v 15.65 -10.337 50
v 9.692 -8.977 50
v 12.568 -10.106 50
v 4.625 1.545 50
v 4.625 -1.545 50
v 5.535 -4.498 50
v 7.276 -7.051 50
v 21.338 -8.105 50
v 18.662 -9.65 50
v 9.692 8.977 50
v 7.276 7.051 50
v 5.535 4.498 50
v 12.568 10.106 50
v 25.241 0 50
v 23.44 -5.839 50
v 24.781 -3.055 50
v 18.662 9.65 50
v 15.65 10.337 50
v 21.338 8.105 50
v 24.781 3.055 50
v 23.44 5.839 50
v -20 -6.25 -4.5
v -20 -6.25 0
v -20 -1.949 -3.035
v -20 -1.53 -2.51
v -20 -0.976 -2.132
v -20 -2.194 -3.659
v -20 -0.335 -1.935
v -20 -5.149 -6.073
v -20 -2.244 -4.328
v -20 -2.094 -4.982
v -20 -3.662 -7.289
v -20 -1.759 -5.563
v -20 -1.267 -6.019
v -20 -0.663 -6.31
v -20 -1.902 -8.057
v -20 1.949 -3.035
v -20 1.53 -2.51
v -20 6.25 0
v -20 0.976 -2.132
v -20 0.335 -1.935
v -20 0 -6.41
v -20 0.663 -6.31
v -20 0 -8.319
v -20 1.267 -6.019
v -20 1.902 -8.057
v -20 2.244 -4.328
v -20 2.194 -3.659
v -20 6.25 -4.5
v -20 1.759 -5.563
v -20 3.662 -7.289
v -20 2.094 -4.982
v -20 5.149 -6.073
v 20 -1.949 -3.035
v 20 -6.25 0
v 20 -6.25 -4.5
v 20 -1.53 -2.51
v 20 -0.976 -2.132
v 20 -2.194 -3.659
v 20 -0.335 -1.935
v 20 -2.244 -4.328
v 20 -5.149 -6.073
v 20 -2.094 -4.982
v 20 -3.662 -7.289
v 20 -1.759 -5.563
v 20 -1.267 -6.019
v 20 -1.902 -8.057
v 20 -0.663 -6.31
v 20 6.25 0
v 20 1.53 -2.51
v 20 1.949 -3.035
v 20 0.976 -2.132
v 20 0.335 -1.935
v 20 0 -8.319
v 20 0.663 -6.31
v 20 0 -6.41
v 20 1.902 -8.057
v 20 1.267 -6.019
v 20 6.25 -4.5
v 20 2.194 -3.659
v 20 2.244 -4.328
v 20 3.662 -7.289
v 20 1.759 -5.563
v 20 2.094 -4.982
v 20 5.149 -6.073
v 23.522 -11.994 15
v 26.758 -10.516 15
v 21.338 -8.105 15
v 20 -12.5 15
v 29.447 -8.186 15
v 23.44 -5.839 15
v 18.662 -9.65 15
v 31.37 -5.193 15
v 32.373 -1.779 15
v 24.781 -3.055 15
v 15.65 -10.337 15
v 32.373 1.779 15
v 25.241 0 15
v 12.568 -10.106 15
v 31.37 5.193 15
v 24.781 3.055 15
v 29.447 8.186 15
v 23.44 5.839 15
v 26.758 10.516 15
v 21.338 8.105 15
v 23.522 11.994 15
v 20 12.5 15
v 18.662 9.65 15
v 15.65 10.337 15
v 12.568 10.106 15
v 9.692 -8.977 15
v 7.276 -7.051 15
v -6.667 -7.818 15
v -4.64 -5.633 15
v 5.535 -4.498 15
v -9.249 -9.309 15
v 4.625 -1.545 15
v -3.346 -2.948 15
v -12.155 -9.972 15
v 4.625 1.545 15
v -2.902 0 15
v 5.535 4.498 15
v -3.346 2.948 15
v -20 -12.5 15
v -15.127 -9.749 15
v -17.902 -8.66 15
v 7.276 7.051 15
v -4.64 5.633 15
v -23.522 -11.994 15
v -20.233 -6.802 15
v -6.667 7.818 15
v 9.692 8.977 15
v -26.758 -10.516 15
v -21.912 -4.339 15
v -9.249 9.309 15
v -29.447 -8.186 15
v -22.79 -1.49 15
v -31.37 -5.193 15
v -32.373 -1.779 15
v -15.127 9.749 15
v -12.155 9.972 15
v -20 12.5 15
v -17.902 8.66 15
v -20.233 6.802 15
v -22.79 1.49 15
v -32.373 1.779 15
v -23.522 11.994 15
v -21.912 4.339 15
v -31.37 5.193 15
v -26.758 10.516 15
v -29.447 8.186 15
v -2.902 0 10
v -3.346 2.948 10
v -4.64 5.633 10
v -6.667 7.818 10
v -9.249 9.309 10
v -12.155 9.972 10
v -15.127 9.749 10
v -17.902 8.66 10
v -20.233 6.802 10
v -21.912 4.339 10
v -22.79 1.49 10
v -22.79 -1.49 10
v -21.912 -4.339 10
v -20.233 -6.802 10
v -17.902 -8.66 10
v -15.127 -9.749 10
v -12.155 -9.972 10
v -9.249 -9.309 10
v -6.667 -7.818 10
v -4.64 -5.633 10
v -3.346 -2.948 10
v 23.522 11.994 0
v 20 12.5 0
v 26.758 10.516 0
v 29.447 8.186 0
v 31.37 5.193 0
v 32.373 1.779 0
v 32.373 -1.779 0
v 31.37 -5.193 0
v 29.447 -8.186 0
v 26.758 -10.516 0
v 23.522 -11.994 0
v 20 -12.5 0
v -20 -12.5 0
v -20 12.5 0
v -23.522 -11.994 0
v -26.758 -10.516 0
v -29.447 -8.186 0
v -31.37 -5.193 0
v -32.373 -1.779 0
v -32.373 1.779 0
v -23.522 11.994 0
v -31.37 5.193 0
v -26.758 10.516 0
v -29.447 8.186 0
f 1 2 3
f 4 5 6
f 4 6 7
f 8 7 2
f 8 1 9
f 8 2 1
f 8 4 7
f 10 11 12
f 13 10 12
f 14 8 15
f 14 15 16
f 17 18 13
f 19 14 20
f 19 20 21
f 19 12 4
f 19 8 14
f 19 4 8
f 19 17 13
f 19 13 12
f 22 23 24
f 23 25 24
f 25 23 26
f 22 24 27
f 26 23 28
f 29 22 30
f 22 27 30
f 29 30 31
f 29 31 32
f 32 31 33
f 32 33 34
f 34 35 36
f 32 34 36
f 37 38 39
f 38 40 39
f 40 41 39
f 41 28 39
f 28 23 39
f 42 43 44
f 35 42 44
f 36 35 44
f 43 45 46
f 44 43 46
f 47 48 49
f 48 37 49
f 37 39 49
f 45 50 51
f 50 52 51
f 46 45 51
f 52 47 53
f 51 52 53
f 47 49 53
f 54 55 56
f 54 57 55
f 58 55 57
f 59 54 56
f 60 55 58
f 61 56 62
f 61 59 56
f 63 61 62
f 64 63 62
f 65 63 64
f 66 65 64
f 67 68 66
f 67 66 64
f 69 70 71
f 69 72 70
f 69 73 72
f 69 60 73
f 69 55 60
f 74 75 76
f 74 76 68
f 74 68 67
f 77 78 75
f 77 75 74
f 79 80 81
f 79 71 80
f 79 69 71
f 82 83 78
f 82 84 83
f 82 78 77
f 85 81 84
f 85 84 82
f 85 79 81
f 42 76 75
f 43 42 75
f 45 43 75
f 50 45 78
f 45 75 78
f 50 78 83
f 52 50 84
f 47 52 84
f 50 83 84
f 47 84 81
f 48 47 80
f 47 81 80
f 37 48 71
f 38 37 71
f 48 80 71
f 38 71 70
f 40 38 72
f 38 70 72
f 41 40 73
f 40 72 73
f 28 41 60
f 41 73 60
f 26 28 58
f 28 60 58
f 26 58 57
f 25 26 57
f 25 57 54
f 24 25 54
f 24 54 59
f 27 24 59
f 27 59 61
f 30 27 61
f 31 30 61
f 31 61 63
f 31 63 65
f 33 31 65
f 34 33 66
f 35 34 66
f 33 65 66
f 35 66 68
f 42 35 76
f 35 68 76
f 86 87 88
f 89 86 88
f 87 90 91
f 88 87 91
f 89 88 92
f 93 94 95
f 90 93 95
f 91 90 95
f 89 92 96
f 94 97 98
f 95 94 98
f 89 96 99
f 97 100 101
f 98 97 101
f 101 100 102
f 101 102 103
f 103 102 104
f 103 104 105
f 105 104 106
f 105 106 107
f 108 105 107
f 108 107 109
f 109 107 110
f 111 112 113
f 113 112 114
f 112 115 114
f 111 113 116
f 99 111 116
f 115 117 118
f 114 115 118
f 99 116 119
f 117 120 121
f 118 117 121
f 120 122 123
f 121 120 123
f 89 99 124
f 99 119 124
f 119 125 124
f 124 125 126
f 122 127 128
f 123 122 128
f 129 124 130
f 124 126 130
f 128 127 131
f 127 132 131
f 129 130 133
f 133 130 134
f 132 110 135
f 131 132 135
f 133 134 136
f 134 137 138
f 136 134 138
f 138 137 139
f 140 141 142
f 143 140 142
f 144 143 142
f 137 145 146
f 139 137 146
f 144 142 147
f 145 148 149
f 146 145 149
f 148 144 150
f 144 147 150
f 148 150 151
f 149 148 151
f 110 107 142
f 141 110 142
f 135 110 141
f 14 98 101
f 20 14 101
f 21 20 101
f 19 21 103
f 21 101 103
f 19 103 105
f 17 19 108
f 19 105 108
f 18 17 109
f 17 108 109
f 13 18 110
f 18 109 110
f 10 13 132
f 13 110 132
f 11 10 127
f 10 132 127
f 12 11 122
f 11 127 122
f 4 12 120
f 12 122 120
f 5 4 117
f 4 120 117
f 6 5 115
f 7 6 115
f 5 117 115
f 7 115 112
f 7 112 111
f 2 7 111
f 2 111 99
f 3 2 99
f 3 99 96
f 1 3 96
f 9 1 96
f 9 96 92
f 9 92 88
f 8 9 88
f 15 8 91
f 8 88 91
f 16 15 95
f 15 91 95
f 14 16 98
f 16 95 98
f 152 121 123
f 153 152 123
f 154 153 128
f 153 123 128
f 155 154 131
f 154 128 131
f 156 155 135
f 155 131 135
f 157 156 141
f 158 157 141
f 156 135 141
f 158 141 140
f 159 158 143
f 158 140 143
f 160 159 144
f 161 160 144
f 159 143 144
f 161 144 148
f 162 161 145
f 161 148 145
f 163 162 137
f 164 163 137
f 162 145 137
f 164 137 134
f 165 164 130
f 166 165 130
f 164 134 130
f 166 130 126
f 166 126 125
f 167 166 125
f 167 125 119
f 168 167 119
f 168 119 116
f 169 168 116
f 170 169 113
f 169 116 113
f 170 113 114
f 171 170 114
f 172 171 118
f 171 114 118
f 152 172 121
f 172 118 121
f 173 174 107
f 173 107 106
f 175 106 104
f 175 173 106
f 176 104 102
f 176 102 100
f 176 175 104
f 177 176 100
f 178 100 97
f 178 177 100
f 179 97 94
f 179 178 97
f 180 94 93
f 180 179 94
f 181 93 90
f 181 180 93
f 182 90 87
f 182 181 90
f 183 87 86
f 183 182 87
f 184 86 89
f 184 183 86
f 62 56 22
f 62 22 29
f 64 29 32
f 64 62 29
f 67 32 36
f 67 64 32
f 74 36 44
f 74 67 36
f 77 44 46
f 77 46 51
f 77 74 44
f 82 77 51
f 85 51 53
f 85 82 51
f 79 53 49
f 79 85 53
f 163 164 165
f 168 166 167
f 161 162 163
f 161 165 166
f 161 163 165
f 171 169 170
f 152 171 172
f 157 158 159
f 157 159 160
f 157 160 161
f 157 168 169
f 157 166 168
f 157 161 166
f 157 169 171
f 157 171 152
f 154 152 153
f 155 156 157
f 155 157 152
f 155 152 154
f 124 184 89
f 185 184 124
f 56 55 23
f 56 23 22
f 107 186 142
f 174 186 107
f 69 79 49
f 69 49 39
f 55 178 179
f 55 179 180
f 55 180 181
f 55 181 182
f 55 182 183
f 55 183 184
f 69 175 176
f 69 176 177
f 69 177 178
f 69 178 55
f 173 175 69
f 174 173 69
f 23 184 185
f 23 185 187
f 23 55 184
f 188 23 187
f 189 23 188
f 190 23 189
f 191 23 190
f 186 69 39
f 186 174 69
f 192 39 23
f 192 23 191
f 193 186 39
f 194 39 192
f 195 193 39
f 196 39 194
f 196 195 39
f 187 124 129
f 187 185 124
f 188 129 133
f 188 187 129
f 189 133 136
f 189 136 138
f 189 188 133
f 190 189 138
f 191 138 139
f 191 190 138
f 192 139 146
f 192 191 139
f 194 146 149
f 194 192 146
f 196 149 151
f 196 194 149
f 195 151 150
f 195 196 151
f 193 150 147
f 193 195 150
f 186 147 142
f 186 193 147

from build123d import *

# Parameters (mm, degrees)
BOSS_EXTRUDE1_DEPTH = 5
BOSS_EXTRUDE2_DEPTH = 5
BOSS_EXTRUDE3_DEPTH = 5
SKETCH5_R           = 10
SKETCH5_R_2         = 7.5
CUT_EXTRUDE1_DEPTH  = 5
SKETCH6_R           = 10.366071997
BOSS_EXTRUDE4_DEPTH = 35
SKETCH7_R           = 7.5
CUT_EXTRUDE2_DEPTH  = 5
BOSS_EXTRUDE5_DEPTH = 40
SKETCH10_R          = 2.25
CUT_EXTRUDE3_DEPTH  = 40


with BuildPart() as part:
    # Sketch1 → Boss-Extrude1 (new body)
    with BuildSketch(Plane.XY):
        with BuildLine():
            Line((-20, 12.5), (20, 12.5))
            ThreePointArc((20, 12.5), (32.5, 0), (20, -12.5))
            Line((20, -12.5), (-20, -12.5))
            ThreePointArc((-20, -12.5), (-32.5, 0), (-20, 12.5))
        make_face()
    extrude(amount=BOSS_EXTRUDE1_DEPTH)

    # Sketch2 → Boss-Extrude2 (add)
    with BuildSketch(Plane.XY.offset(5)):
        with BuildLine():
            Line((-20, 12.5), (20, 12.5))
            ThreePointArc((20, 12.5), (32.5, 0), (20, -12.5))
            Line((20, -12.5), (-20, -12.5))
            ThreePointArc((-20, -12.5), (-32.5, 0), (-20, 12.5))
        make_face()
    extrude(amount=BOSS_EXTRUDE2_DEPTH)

    # Sketch4 → Boss-Extrude3 (add)
    with BuildSketch(Plane.XY.offset(10)):
        with BuildLine():
            Line((-20, 12.5), (20, 12.5))
            ThreePointArc((20, 12.5), (32.5, 0), (20, -12.5))
            Line((20, -12.5), (-20, -12.5))
            ThreePointArc((-20, -12.5), (-32.5, 0), (-20, 12.5))
        make_face()
    extrude(amount=BOSS_EXTRUDE3_DEPTH)

    # Sketch5 → Cut-Extrude1 (cut)
    with BuildSketch(Plane.XY.offset(15)):
        with Locations((-12.902032685, 0)):
            Circle(SKETCH5_R)
        with Locations((-12.902032685, 0)):
            Circle(SKETCH5_R_2, mode=Mode.SUBTRACT)
    extrude(amount=-CUT_EXTRUDE1_DEPTH, mode=Mode.SUBTRACT)

    # Sketch6 → Boss-Extrude4 (add)
    with BuildSketch(Plane.XY.offset(15)):
        with Locations((14.874986592, 0)):
            Circle(SKETCH6_R)
    extrude(amount=BOSS_EXTRUDE4_DEPTH)

    # Sketch7 → Cut-Extrude2 (cut)
    with BuildSketch(Plane.XY.offset(15)):
        with Locations((-12.902032685, 0)):
            Circle(SKETCH7_R)
    extrude(amount=-CUT_EXTRUDE2_DEPTH, mode=Mode.SUBTRACT)

    # Sketch9 → Boss-Extrude5 (add)
    with BuildSketch(Plane(origin=(20, 0, 0), x_dir=(0, 0, -1), z_dir=(1, 0, 0))):
        with BuildLine():
            Line((0, 6.25), (0, 0))
            Line((0, 0), (0, -6.25))
            Line((0, -6.25), (4.5, -6.25))
            ThreePointArc((4.5, -6.25), (8.319298262, 0), (4.5, 6.25))
            Line((4.5, 6.25), (0, 6.25))
        make_face()
    extrude(amount=-BOSS_EXTRUDE5_DEPTH)

    # Sketch10 → Cut-Extrude3 (cut)
    with BuildSketch(Plane(origin=(20, 0, 0), x_dir=(0, 0, -1), z_dir=(1, 0, 0))):
        with Locations((4.159649131, 0)):
            Circle(SKETCH10_R)
    extrude(amount=-CUT_EXTRUDE3_DEPTH, mode=Mode.SUBTRACT)


solid = part.part
